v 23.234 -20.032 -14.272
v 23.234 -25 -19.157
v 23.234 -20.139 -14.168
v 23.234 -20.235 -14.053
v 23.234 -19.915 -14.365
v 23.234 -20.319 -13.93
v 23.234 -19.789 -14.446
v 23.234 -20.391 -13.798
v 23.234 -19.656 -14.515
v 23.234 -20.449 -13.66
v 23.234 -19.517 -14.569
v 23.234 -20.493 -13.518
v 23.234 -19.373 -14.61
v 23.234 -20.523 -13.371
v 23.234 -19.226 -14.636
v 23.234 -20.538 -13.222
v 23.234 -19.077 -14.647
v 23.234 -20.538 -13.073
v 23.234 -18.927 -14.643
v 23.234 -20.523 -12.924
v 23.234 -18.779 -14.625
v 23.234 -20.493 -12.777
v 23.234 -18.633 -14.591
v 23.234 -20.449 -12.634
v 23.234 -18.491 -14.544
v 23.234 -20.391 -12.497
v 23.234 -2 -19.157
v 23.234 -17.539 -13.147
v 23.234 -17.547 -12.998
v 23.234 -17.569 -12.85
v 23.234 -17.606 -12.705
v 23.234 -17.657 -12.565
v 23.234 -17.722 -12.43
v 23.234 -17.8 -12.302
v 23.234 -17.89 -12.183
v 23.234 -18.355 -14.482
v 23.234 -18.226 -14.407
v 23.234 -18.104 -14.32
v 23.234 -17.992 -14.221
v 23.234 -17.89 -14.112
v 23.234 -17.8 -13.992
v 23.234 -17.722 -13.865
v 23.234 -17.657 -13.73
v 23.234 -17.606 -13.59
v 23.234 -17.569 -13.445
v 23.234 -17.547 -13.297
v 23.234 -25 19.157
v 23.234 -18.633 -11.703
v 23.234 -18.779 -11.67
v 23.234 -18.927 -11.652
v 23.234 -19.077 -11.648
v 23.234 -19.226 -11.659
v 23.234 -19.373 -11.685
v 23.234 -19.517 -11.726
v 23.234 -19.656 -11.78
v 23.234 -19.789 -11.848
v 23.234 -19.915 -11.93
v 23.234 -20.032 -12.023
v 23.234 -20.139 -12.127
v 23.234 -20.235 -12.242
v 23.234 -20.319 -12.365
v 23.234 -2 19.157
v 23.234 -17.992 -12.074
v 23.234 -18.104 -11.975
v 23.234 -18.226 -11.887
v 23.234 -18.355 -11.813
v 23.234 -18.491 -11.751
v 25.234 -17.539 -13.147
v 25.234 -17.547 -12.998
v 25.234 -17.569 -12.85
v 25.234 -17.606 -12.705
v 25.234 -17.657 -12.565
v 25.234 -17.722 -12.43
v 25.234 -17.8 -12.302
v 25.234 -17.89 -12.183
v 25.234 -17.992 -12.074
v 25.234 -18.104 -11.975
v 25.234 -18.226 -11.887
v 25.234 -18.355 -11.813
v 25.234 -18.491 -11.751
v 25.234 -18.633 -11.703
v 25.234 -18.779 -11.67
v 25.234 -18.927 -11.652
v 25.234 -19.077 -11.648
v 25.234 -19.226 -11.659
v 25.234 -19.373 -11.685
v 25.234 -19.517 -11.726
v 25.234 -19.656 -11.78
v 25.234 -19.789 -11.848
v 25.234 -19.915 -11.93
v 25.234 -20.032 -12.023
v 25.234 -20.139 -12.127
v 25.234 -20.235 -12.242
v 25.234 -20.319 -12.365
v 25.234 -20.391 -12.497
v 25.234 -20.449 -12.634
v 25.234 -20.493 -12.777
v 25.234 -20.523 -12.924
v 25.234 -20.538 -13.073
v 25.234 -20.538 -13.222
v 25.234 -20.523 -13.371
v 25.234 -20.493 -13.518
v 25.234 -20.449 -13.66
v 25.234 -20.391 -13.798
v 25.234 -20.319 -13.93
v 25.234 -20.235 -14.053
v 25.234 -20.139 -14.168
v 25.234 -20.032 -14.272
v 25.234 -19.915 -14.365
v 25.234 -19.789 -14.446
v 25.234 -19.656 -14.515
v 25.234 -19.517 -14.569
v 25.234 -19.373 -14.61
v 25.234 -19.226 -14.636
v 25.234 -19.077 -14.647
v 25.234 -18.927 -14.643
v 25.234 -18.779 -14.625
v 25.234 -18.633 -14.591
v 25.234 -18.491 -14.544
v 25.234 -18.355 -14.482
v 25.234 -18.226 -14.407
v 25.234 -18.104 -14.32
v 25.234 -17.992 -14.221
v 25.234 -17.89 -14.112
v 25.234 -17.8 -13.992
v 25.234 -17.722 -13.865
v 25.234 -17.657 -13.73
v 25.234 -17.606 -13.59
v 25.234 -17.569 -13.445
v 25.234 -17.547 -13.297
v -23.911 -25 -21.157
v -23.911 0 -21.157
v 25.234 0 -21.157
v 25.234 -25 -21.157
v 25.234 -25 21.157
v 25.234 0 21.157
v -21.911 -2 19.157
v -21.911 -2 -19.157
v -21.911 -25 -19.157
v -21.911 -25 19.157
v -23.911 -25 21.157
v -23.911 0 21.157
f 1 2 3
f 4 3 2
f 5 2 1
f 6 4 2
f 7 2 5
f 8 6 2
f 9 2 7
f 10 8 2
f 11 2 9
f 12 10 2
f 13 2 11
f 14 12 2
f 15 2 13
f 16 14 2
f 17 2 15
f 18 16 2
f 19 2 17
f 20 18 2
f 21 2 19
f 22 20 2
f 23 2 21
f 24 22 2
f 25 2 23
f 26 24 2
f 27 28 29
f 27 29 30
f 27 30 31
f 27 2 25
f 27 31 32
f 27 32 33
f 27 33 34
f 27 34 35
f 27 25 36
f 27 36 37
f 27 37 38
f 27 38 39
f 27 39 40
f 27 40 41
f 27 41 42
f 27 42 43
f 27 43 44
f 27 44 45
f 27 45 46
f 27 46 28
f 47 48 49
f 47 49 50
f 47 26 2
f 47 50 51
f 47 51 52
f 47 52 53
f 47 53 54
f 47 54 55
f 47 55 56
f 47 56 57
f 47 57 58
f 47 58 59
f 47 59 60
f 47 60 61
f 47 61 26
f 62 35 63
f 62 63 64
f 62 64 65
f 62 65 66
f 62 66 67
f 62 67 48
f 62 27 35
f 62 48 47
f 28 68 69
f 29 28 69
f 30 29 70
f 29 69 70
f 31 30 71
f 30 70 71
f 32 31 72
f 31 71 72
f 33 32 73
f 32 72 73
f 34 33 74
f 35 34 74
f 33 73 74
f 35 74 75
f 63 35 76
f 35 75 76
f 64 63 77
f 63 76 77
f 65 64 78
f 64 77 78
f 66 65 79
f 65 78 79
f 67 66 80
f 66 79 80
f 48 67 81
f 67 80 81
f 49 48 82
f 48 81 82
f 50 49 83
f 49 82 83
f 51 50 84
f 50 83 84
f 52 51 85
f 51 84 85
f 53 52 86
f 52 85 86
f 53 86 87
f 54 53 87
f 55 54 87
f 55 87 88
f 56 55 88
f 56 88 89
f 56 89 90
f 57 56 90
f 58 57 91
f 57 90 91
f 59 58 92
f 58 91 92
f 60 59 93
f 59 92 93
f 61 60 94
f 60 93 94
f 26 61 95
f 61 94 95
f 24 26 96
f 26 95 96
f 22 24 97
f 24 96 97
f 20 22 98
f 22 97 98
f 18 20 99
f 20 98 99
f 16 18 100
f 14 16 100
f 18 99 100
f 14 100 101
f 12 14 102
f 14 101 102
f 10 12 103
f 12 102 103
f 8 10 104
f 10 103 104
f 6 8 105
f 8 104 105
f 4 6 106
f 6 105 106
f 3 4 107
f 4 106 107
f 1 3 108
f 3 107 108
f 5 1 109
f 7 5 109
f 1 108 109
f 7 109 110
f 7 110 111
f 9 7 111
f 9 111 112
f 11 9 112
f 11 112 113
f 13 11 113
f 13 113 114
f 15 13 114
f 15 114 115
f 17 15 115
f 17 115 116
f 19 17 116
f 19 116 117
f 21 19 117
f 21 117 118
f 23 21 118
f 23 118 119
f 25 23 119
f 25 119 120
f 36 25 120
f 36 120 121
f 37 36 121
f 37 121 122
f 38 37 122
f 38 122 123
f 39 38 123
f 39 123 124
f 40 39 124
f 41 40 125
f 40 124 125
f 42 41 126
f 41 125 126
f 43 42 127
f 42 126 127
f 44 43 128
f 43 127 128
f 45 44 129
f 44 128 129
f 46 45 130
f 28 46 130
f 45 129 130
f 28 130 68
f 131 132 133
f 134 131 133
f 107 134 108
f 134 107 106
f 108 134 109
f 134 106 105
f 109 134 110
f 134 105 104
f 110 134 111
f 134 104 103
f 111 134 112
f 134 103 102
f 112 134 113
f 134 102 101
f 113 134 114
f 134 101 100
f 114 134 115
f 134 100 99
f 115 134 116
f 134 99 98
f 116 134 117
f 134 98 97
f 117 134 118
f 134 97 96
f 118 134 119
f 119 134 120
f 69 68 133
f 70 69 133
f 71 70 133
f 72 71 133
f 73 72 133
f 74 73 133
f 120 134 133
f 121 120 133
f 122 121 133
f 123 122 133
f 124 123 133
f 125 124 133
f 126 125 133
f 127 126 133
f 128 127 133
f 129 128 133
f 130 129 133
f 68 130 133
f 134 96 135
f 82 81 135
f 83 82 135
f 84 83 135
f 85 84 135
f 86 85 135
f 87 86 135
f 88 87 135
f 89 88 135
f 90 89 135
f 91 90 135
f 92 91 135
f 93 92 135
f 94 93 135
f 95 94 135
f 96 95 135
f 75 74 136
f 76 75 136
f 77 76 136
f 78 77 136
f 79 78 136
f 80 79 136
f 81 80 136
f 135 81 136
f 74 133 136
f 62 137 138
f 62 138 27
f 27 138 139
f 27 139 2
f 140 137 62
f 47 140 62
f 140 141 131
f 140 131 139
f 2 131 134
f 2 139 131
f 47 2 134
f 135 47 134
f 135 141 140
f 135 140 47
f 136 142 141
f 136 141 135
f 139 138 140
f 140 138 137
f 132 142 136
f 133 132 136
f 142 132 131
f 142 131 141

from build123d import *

# Parameters (mm, degrees)
F0_W     = 45.1445972584
F0_H     = 38.3139892519
F1_DEPTH = 2
F0_W_2   = 49.1445972584
F0_H_2   = 42.3139892519
F2_DEPTH = 25
F3_R     = 1.5
F4_DEPTH = 2


with BuildPart() as f1:
    # F0 (on Front) → F1 (new body)
    with BuildSketch(Plane.XZ):
        with Locations((0.661252765, 0)):
            Rectangle(F0_W, F0_H)
    extrude(amount=F1_DEPTH)

    # F0 (on Front) → F2 (join)
    with BuildSketch(Plane.XZ):
        with Locations((0.661252765, 0)):
            Rectangle(F0_W_2, F0_H_2)
        with Locations((0.661252765, 0)):
            Rectangle(F0_W, F0_H, mode=Mode.SUBTRACT)
    extrude(amount=F2_DEPTH)

    # F3 (on face) → F4 (cut, through all)
    with BuildSketch(Plane.YZ.offset(25.2335513942)):
        with Locations((-19.0394744277, -13.1474239752)):
            Circle(F3_R)
    extrude(amount=-F4_DEPTH, mode=Mode.SUBTRACT)


solid = f1.part
